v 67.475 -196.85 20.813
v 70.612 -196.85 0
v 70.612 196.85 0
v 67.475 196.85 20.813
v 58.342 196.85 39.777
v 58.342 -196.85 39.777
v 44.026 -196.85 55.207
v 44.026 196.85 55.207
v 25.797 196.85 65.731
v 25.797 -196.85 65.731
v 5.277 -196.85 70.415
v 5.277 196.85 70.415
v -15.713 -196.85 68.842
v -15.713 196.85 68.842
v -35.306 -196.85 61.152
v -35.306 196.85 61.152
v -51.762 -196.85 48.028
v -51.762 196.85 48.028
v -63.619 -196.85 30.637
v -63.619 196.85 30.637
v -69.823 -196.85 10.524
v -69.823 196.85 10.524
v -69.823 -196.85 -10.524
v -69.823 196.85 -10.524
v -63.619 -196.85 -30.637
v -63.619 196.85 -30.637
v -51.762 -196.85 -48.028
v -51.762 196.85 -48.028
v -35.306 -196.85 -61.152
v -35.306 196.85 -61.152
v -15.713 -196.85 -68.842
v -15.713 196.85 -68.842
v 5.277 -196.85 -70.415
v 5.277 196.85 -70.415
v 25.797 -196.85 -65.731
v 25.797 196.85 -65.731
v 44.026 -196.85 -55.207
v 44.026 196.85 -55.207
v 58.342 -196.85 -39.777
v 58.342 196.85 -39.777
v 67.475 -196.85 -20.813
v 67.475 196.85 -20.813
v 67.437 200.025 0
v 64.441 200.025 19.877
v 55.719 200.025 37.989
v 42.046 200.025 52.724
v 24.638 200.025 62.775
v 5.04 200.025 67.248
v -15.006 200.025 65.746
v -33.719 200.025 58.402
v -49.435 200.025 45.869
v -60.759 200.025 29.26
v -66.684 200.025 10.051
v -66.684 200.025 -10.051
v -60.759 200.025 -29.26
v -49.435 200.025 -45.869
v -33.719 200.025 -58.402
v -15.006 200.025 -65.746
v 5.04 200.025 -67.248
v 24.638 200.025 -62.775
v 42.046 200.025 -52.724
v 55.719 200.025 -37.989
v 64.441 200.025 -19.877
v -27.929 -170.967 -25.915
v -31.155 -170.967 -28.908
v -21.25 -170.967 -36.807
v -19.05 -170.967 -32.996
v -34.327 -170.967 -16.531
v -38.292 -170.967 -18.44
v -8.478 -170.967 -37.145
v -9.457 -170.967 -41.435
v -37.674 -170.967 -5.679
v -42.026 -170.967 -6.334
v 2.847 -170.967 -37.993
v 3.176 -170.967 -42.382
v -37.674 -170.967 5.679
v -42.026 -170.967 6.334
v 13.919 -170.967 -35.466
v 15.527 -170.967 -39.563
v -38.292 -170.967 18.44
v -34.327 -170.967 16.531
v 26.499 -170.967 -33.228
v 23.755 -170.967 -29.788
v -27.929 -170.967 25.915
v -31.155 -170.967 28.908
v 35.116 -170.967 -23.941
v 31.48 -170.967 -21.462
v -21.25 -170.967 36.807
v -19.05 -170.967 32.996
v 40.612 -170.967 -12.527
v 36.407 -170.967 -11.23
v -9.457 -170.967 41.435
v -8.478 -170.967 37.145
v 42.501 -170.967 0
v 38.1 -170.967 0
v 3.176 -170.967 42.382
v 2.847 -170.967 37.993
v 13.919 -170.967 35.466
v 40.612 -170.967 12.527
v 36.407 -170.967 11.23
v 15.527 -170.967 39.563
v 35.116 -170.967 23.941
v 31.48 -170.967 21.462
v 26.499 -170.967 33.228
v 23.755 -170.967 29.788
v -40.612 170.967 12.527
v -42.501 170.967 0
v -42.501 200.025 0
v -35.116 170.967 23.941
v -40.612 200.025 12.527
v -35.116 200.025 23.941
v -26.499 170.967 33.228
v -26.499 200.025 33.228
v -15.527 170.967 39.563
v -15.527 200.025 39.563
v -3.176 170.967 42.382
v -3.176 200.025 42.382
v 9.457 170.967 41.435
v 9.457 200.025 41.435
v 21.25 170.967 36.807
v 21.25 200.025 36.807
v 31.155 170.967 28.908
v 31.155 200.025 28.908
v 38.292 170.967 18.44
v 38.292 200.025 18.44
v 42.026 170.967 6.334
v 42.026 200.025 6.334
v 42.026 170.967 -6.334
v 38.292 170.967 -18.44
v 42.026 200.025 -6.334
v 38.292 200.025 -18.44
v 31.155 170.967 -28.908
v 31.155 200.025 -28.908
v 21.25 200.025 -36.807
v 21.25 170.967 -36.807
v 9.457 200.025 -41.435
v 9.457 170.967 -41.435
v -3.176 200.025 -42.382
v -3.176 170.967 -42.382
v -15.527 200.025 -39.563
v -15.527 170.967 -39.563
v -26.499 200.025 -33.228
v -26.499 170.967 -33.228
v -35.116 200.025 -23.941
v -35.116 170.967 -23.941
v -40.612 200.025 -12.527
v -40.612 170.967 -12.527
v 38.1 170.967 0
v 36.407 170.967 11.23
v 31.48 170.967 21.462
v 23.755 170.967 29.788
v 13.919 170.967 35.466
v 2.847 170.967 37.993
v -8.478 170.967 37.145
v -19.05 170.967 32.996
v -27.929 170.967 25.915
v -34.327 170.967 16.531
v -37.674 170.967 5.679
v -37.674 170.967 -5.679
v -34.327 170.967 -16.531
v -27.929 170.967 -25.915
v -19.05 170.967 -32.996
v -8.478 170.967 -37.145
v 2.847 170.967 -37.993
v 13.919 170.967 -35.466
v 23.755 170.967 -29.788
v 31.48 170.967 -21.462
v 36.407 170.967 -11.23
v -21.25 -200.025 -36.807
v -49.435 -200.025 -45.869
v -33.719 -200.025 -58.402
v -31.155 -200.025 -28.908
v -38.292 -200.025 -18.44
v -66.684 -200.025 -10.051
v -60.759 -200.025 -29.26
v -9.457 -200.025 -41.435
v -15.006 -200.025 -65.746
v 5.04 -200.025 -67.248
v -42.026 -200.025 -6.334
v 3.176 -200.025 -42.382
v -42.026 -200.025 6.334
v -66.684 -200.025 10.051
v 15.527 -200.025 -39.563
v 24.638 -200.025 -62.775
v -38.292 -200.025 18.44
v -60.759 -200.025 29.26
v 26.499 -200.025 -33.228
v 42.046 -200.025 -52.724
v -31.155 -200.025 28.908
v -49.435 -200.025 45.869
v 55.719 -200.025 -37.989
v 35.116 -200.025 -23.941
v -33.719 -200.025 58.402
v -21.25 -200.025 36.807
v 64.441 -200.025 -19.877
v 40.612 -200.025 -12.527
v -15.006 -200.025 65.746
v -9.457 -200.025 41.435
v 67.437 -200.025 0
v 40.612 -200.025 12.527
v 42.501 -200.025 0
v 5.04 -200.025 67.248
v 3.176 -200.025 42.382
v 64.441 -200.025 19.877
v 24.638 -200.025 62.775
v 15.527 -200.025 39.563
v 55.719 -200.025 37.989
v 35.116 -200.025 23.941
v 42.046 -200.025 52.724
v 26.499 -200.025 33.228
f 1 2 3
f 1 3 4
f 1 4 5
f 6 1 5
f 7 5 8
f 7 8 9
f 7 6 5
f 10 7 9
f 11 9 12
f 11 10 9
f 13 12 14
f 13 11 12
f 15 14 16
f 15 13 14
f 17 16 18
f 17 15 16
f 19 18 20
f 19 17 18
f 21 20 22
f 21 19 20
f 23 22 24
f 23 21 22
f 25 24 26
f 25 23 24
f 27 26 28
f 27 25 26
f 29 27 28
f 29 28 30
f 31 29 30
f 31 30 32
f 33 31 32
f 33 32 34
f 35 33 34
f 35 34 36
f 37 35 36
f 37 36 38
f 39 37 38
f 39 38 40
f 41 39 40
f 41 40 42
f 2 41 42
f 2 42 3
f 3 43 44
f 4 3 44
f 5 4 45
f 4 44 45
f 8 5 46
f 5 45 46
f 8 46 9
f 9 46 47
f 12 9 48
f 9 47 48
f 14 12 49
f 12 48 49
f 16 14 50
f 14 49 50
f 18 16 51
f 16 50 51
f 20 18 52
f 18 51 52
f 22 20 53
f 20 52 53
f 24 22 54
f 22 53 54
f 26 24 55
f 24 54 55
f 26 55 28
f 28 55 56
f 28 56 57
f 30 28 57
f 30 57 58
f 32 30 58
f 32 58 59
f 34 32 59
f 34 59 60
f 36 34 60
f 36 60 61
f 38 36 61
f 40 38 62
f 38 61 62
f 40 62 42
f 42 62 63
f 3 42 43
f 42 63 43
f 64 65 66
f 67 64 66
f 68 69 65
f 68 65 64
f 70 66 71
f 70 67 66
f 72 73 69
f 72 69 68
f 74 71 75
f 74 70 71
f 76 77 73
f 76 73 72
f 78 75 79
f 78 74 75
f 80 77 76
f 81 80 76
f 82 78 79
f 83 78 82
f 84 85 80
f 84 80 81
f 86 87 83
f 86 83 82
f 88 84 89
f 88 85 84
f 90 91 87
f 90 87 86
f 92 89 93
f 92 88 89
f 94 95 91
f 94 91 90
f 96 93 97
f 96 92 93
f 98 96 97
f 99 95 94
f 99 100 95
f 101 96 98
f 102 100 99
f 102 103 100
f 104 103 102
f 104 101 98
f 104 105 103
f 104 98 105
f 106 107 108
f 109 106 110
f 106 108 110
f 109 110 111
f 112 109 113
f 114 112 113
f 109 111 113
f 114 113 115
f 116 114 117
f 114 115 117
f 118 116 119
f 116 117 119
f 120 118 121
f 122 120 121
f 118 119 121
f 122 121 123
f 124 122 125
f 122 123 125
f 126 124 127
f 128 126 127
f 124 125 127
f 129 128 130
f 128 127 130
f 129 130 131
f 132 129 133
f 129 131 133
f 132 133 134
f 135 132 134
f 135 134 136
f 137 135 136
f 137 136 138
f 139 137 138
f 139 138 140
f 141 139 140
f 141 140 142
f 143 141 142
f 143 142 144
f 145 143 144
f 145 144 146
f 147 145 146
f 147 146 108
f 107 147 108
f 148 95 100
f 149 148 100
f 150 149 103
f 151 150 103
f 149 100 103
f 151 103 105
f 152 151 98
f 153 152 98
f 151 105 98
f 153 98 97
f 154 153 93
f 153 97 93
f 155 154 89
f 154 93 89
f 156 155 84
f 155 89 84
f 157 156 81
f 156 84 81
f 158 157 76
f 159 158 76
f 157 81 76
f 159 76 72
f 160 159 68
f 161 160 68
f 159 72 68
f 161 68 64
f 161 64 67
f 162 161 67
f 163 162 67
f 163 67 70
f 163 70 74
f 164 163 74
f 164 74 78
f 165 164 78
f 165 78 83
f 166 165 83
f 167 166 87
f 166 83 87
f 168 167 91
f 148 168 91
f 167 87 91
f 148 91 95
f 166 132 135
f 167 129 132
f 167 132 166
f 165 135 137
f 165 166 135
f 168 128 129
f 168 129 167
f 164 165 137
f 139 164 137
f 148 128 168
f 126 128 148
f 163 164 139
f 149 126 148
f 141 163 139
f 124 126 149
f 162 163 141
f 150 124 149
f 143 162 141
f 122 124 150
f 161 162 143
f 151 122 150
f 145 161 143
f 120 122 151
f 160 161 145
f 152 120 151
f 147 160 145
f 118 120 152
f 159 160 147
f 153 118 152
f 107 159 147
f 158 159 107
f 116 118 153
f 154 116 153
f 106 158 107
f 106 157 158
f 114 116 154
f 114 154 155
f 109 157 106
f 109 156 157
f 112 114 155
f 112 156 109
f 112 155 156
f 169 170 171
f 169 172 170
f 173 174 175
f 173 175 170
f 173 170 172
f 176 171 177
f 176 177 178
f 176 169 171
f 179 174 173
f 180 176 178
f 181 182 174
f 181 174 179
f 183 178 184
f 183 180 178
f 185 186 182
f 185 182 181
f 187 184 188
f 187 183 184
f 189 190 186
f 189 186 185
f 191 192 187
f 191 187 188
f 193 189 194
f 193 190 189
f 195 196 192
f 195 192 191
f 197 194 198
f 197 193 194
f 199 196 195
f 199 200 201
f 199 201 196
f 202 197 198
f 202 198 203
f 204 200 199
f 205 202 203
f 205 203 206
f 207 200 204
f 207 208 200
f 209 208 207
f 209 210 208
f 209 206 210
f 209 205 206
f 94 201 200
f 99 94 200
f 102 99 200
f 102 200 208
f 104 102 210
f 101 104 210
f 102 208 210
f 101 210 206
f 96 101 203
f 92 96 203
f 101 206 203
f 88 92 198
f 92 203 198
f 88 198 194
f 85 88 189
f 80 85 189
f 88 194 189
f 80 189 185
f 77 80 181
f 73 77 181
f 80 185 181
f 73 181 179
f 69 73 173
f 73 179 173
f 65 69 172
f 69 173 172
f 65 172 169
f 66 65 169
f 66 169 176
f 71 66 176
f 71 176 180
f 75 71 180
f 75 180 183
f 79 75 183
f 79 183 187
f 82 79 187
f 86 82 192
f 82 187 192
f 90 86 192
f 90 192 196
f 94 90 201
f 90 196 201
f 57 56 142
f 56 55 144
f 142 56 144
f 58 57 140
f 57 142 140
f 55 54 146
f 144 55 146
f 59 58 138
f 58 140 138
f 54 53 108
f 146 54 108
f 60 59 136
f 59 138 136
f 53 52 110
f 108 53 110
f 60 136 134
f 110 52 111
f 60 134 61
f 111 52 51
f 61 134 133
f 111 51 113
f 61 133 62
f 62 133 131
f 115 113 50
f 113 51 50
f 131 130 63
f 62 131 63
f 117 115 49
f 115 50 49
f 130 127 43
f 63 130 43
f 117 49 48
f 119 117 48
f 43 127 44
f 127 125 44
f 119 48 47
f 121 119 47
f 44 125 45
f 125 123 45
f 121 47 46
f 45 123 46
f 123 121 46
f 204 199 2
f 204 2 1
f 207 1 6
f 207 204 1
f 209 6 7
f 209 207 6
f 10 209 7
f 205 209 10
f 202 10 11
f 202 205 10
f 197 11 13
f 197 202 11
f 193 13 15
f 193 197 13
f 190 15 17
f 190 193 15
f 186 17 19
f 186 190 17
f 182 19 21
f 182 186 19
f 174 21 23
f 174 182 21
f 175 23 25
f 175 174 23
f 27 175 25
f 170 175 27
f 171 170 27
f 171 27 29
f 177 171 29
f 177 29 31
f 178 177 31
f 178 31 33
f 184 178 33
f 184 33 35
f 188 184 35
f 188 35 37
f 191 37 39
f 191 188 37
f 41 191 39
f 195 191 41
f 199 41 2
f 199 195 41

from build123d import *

# Parameters (mm, degrees)
F0_R           = 70.612
F1_DEPTH       = 200.025
F2_SIZE        = 3.175
F4_D           = 76.2
F4_CBORE_D     = 85.0011
F4_CBORE_DEPTH = 29.0576
F5_R           = 42.50055
F6_DEPTH       = 29.0576


with BuildPart() as f1:
    # F0 (on Front) → F1 (new body, symmetric)
    with BuildSketch(Plane.XZ):
        Circle(F0_R)
    extrude(amount=F1_DEPTH, both=True)

    # F2
    f2_edges = [f1.edges().sort_by_distance(p)[0] for p in [
        (-70.612, -200.025, 0),
        (-70.612, 200.025, 0),
    ]]
    chamfer(f2_edges, length=F2_SIZE)

    # F4 (through all)
    with Locations(Plane(origin=(0, 200.025, 0), x_dir=(-1, 0, 0), z_dir=(0, 1, 0))):
        with Locations((0, 0)):
            CounterBoreHole(F4_D / 2, F4_CBORE_D / 2, F4_CBORE_DEPTH)

    # F5 (on face) → F6 (cut)
    with BuildSketch(Plane.XZ.offset(200.025)):
        Circle(F5_R)
    extrude(amount=-F6_DEPTH, mode=Mode.SUBTRACT)


solid = f1.part
